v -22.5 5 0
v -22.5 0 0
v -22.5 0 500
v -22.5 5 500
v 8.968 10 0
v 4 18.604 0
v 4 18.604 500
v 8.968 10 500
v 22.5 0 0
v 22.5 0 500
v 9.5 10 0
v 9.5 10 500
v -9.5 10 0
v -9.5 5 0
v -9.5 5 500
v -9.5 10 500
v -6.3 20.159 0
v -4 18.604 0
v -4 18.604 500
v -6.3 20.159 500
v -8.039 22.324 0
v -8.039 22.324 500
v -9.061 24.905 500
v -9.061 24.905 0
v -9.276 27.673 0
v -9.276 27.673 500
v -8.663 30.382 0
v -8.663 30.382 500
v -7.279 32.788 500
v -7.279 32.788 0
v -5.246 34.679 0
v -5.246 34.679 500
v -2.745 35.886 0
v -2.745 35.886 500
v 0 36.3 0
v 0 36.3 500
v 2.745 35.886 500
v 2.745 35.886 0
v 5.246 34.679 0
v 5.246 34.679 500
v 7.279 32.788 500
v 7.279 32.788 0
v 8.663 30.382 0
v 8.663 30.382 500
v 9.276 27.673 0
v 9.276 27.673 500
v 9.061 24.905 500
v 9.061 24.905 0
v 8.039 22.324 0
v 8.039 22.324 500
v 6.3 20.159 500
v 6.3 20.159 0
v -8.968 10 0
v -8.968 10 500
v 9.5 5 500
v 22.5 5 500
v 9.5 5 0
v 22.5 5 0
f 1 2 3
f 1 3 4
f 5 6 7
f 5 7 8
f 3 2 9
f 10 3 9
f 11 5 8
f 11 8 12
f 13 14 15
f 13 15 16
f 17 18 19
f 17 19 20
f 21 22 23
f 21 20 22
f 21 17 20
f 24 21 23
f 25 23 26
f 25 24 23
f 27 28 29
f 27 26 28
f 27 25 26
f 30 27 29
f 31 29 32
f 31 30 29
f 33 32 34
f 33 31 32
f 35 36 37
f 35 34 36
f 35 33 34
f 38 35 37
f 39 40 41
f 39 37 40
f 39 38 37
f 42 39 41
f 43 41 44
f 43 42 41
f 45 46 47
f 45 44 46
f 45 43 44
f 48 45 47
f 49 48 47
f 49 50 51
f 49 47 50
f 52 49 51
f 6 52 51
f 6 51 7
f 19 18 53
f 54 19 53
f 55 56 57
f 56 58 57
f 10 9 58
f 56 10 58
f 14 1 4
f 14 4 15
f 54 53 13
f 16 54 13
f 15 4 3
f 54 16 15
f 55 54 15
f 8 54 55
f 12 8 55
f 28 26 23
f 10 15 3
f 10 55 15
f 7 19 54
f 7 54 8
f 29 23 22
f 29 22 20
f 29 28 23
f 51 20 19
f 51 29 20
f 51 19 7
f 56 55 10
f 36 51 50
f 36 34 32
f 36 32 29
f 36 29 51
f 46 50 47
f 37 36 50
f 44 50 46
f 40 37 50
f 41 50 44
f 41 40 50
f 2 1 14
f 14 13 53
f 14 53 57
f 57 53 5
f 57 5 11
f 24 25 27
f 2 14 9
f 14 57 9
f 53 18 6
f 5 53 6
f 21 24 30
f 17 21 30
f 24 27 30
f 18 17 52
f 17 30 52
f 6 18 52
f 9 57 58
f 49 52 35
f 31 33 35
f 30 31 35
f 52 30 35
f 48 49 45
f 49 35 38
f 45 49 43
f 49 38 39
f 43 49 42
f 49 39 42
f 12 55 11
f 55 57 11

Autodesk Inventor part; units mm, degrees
ref_plane "YZ Plane" through (0, 0, 0) normal (1, 0, 0) x (0, 1, 0)
ref_plane "XZ Plane" through (0, 0, 0) normal (0, 1, 0) x (-1, 0, 0)
ref_plane "XY Plane" through (0, 0, 0) normal (0, 0, 1) x (1, 0, 0)
sketch "Sketch1" plane through (0, 0, 0) normal (0, 0, 1) x (1, 0, 0)
  line L0 (-22.5, 0) -> (22.5, 0)
  line L1 (22.5, 0) -> (22.5, 5)
  line L2 (-22.5, 0) -> (-22.5, 5)
  line L3 (-22.5, 5) -> (-9.5, 5)
  line L4 (22.5, 5) -> (9.5, 5)
  line L5 (-9.5, 5) -> (-9.5, 10)
  line L6 (9.5, 5) -> (9.5, 10)
  arc A0 (4, 18.6042) -> (-4, 18.6042) centre (0, 27) ccw
  line L7 (4, 18.6042) -> (8.9676, 10)
  line L8 (-4, 18.6042) -> (-8.9676, 10)
  line L9 (-9.5, 10) -> (9.5, 10) construction
  line L10 (-8.9676, 10) -> (-9.5, 10) construction
  line L11 (-8.9676, 10) -> (-9.5, 10)
  line L12 (8.9676, 10) -> (9.5, 10)
  line L13 (-11.4601, 5) -> (-11.4601, 0) construction
  line L14 (-16.9601, 5) -> (-16.9601, 0) construction
  line L15 (13.0399, 5) -> (13.0399, 0) construction
  line L16 (18.5399, 5) -> (18.5399, 0) construction
  arc A1 (-4, 18.6042) -> (4, 18.6042) centre (0, 27) ccw construction
  point P0 (0, 0)
  point P1 (0, 0)
  point P2 (0, 17.7)
  point P3 (15.7899, 5)
  point P4 (-14.2101, 5)
  dimension "B" = 45
  dimension "t" = 5
  dimension "d2" = 5
  dimension "dimensionf" = 19
  dimension "d4" = 13
  dimension "Y" = 10
  dimension "d6" = 5
  dimension "d" = 18.6
  dimension "e" = 22.5
  dimension "dimensionH" = 17.7
  dimension "dimensionh" = 27
  dimension "x" = 8
  dimension "d16" = 4
  dimension "dimensionc" = 30
  dimension "d21" = 6.7101
  dimension "s1" = 5.5
  dimension "d23" = 5.5
  dimension "d24" = 2.75
  dimension "d25" = 2.75
extrude "Extrusion1" add sketch "Sketch1" along normal blind 500
equation "\"d2\" = t"
equation "\"d16\" = 0.5 * x"
properties part number "sbr20_500mm"
